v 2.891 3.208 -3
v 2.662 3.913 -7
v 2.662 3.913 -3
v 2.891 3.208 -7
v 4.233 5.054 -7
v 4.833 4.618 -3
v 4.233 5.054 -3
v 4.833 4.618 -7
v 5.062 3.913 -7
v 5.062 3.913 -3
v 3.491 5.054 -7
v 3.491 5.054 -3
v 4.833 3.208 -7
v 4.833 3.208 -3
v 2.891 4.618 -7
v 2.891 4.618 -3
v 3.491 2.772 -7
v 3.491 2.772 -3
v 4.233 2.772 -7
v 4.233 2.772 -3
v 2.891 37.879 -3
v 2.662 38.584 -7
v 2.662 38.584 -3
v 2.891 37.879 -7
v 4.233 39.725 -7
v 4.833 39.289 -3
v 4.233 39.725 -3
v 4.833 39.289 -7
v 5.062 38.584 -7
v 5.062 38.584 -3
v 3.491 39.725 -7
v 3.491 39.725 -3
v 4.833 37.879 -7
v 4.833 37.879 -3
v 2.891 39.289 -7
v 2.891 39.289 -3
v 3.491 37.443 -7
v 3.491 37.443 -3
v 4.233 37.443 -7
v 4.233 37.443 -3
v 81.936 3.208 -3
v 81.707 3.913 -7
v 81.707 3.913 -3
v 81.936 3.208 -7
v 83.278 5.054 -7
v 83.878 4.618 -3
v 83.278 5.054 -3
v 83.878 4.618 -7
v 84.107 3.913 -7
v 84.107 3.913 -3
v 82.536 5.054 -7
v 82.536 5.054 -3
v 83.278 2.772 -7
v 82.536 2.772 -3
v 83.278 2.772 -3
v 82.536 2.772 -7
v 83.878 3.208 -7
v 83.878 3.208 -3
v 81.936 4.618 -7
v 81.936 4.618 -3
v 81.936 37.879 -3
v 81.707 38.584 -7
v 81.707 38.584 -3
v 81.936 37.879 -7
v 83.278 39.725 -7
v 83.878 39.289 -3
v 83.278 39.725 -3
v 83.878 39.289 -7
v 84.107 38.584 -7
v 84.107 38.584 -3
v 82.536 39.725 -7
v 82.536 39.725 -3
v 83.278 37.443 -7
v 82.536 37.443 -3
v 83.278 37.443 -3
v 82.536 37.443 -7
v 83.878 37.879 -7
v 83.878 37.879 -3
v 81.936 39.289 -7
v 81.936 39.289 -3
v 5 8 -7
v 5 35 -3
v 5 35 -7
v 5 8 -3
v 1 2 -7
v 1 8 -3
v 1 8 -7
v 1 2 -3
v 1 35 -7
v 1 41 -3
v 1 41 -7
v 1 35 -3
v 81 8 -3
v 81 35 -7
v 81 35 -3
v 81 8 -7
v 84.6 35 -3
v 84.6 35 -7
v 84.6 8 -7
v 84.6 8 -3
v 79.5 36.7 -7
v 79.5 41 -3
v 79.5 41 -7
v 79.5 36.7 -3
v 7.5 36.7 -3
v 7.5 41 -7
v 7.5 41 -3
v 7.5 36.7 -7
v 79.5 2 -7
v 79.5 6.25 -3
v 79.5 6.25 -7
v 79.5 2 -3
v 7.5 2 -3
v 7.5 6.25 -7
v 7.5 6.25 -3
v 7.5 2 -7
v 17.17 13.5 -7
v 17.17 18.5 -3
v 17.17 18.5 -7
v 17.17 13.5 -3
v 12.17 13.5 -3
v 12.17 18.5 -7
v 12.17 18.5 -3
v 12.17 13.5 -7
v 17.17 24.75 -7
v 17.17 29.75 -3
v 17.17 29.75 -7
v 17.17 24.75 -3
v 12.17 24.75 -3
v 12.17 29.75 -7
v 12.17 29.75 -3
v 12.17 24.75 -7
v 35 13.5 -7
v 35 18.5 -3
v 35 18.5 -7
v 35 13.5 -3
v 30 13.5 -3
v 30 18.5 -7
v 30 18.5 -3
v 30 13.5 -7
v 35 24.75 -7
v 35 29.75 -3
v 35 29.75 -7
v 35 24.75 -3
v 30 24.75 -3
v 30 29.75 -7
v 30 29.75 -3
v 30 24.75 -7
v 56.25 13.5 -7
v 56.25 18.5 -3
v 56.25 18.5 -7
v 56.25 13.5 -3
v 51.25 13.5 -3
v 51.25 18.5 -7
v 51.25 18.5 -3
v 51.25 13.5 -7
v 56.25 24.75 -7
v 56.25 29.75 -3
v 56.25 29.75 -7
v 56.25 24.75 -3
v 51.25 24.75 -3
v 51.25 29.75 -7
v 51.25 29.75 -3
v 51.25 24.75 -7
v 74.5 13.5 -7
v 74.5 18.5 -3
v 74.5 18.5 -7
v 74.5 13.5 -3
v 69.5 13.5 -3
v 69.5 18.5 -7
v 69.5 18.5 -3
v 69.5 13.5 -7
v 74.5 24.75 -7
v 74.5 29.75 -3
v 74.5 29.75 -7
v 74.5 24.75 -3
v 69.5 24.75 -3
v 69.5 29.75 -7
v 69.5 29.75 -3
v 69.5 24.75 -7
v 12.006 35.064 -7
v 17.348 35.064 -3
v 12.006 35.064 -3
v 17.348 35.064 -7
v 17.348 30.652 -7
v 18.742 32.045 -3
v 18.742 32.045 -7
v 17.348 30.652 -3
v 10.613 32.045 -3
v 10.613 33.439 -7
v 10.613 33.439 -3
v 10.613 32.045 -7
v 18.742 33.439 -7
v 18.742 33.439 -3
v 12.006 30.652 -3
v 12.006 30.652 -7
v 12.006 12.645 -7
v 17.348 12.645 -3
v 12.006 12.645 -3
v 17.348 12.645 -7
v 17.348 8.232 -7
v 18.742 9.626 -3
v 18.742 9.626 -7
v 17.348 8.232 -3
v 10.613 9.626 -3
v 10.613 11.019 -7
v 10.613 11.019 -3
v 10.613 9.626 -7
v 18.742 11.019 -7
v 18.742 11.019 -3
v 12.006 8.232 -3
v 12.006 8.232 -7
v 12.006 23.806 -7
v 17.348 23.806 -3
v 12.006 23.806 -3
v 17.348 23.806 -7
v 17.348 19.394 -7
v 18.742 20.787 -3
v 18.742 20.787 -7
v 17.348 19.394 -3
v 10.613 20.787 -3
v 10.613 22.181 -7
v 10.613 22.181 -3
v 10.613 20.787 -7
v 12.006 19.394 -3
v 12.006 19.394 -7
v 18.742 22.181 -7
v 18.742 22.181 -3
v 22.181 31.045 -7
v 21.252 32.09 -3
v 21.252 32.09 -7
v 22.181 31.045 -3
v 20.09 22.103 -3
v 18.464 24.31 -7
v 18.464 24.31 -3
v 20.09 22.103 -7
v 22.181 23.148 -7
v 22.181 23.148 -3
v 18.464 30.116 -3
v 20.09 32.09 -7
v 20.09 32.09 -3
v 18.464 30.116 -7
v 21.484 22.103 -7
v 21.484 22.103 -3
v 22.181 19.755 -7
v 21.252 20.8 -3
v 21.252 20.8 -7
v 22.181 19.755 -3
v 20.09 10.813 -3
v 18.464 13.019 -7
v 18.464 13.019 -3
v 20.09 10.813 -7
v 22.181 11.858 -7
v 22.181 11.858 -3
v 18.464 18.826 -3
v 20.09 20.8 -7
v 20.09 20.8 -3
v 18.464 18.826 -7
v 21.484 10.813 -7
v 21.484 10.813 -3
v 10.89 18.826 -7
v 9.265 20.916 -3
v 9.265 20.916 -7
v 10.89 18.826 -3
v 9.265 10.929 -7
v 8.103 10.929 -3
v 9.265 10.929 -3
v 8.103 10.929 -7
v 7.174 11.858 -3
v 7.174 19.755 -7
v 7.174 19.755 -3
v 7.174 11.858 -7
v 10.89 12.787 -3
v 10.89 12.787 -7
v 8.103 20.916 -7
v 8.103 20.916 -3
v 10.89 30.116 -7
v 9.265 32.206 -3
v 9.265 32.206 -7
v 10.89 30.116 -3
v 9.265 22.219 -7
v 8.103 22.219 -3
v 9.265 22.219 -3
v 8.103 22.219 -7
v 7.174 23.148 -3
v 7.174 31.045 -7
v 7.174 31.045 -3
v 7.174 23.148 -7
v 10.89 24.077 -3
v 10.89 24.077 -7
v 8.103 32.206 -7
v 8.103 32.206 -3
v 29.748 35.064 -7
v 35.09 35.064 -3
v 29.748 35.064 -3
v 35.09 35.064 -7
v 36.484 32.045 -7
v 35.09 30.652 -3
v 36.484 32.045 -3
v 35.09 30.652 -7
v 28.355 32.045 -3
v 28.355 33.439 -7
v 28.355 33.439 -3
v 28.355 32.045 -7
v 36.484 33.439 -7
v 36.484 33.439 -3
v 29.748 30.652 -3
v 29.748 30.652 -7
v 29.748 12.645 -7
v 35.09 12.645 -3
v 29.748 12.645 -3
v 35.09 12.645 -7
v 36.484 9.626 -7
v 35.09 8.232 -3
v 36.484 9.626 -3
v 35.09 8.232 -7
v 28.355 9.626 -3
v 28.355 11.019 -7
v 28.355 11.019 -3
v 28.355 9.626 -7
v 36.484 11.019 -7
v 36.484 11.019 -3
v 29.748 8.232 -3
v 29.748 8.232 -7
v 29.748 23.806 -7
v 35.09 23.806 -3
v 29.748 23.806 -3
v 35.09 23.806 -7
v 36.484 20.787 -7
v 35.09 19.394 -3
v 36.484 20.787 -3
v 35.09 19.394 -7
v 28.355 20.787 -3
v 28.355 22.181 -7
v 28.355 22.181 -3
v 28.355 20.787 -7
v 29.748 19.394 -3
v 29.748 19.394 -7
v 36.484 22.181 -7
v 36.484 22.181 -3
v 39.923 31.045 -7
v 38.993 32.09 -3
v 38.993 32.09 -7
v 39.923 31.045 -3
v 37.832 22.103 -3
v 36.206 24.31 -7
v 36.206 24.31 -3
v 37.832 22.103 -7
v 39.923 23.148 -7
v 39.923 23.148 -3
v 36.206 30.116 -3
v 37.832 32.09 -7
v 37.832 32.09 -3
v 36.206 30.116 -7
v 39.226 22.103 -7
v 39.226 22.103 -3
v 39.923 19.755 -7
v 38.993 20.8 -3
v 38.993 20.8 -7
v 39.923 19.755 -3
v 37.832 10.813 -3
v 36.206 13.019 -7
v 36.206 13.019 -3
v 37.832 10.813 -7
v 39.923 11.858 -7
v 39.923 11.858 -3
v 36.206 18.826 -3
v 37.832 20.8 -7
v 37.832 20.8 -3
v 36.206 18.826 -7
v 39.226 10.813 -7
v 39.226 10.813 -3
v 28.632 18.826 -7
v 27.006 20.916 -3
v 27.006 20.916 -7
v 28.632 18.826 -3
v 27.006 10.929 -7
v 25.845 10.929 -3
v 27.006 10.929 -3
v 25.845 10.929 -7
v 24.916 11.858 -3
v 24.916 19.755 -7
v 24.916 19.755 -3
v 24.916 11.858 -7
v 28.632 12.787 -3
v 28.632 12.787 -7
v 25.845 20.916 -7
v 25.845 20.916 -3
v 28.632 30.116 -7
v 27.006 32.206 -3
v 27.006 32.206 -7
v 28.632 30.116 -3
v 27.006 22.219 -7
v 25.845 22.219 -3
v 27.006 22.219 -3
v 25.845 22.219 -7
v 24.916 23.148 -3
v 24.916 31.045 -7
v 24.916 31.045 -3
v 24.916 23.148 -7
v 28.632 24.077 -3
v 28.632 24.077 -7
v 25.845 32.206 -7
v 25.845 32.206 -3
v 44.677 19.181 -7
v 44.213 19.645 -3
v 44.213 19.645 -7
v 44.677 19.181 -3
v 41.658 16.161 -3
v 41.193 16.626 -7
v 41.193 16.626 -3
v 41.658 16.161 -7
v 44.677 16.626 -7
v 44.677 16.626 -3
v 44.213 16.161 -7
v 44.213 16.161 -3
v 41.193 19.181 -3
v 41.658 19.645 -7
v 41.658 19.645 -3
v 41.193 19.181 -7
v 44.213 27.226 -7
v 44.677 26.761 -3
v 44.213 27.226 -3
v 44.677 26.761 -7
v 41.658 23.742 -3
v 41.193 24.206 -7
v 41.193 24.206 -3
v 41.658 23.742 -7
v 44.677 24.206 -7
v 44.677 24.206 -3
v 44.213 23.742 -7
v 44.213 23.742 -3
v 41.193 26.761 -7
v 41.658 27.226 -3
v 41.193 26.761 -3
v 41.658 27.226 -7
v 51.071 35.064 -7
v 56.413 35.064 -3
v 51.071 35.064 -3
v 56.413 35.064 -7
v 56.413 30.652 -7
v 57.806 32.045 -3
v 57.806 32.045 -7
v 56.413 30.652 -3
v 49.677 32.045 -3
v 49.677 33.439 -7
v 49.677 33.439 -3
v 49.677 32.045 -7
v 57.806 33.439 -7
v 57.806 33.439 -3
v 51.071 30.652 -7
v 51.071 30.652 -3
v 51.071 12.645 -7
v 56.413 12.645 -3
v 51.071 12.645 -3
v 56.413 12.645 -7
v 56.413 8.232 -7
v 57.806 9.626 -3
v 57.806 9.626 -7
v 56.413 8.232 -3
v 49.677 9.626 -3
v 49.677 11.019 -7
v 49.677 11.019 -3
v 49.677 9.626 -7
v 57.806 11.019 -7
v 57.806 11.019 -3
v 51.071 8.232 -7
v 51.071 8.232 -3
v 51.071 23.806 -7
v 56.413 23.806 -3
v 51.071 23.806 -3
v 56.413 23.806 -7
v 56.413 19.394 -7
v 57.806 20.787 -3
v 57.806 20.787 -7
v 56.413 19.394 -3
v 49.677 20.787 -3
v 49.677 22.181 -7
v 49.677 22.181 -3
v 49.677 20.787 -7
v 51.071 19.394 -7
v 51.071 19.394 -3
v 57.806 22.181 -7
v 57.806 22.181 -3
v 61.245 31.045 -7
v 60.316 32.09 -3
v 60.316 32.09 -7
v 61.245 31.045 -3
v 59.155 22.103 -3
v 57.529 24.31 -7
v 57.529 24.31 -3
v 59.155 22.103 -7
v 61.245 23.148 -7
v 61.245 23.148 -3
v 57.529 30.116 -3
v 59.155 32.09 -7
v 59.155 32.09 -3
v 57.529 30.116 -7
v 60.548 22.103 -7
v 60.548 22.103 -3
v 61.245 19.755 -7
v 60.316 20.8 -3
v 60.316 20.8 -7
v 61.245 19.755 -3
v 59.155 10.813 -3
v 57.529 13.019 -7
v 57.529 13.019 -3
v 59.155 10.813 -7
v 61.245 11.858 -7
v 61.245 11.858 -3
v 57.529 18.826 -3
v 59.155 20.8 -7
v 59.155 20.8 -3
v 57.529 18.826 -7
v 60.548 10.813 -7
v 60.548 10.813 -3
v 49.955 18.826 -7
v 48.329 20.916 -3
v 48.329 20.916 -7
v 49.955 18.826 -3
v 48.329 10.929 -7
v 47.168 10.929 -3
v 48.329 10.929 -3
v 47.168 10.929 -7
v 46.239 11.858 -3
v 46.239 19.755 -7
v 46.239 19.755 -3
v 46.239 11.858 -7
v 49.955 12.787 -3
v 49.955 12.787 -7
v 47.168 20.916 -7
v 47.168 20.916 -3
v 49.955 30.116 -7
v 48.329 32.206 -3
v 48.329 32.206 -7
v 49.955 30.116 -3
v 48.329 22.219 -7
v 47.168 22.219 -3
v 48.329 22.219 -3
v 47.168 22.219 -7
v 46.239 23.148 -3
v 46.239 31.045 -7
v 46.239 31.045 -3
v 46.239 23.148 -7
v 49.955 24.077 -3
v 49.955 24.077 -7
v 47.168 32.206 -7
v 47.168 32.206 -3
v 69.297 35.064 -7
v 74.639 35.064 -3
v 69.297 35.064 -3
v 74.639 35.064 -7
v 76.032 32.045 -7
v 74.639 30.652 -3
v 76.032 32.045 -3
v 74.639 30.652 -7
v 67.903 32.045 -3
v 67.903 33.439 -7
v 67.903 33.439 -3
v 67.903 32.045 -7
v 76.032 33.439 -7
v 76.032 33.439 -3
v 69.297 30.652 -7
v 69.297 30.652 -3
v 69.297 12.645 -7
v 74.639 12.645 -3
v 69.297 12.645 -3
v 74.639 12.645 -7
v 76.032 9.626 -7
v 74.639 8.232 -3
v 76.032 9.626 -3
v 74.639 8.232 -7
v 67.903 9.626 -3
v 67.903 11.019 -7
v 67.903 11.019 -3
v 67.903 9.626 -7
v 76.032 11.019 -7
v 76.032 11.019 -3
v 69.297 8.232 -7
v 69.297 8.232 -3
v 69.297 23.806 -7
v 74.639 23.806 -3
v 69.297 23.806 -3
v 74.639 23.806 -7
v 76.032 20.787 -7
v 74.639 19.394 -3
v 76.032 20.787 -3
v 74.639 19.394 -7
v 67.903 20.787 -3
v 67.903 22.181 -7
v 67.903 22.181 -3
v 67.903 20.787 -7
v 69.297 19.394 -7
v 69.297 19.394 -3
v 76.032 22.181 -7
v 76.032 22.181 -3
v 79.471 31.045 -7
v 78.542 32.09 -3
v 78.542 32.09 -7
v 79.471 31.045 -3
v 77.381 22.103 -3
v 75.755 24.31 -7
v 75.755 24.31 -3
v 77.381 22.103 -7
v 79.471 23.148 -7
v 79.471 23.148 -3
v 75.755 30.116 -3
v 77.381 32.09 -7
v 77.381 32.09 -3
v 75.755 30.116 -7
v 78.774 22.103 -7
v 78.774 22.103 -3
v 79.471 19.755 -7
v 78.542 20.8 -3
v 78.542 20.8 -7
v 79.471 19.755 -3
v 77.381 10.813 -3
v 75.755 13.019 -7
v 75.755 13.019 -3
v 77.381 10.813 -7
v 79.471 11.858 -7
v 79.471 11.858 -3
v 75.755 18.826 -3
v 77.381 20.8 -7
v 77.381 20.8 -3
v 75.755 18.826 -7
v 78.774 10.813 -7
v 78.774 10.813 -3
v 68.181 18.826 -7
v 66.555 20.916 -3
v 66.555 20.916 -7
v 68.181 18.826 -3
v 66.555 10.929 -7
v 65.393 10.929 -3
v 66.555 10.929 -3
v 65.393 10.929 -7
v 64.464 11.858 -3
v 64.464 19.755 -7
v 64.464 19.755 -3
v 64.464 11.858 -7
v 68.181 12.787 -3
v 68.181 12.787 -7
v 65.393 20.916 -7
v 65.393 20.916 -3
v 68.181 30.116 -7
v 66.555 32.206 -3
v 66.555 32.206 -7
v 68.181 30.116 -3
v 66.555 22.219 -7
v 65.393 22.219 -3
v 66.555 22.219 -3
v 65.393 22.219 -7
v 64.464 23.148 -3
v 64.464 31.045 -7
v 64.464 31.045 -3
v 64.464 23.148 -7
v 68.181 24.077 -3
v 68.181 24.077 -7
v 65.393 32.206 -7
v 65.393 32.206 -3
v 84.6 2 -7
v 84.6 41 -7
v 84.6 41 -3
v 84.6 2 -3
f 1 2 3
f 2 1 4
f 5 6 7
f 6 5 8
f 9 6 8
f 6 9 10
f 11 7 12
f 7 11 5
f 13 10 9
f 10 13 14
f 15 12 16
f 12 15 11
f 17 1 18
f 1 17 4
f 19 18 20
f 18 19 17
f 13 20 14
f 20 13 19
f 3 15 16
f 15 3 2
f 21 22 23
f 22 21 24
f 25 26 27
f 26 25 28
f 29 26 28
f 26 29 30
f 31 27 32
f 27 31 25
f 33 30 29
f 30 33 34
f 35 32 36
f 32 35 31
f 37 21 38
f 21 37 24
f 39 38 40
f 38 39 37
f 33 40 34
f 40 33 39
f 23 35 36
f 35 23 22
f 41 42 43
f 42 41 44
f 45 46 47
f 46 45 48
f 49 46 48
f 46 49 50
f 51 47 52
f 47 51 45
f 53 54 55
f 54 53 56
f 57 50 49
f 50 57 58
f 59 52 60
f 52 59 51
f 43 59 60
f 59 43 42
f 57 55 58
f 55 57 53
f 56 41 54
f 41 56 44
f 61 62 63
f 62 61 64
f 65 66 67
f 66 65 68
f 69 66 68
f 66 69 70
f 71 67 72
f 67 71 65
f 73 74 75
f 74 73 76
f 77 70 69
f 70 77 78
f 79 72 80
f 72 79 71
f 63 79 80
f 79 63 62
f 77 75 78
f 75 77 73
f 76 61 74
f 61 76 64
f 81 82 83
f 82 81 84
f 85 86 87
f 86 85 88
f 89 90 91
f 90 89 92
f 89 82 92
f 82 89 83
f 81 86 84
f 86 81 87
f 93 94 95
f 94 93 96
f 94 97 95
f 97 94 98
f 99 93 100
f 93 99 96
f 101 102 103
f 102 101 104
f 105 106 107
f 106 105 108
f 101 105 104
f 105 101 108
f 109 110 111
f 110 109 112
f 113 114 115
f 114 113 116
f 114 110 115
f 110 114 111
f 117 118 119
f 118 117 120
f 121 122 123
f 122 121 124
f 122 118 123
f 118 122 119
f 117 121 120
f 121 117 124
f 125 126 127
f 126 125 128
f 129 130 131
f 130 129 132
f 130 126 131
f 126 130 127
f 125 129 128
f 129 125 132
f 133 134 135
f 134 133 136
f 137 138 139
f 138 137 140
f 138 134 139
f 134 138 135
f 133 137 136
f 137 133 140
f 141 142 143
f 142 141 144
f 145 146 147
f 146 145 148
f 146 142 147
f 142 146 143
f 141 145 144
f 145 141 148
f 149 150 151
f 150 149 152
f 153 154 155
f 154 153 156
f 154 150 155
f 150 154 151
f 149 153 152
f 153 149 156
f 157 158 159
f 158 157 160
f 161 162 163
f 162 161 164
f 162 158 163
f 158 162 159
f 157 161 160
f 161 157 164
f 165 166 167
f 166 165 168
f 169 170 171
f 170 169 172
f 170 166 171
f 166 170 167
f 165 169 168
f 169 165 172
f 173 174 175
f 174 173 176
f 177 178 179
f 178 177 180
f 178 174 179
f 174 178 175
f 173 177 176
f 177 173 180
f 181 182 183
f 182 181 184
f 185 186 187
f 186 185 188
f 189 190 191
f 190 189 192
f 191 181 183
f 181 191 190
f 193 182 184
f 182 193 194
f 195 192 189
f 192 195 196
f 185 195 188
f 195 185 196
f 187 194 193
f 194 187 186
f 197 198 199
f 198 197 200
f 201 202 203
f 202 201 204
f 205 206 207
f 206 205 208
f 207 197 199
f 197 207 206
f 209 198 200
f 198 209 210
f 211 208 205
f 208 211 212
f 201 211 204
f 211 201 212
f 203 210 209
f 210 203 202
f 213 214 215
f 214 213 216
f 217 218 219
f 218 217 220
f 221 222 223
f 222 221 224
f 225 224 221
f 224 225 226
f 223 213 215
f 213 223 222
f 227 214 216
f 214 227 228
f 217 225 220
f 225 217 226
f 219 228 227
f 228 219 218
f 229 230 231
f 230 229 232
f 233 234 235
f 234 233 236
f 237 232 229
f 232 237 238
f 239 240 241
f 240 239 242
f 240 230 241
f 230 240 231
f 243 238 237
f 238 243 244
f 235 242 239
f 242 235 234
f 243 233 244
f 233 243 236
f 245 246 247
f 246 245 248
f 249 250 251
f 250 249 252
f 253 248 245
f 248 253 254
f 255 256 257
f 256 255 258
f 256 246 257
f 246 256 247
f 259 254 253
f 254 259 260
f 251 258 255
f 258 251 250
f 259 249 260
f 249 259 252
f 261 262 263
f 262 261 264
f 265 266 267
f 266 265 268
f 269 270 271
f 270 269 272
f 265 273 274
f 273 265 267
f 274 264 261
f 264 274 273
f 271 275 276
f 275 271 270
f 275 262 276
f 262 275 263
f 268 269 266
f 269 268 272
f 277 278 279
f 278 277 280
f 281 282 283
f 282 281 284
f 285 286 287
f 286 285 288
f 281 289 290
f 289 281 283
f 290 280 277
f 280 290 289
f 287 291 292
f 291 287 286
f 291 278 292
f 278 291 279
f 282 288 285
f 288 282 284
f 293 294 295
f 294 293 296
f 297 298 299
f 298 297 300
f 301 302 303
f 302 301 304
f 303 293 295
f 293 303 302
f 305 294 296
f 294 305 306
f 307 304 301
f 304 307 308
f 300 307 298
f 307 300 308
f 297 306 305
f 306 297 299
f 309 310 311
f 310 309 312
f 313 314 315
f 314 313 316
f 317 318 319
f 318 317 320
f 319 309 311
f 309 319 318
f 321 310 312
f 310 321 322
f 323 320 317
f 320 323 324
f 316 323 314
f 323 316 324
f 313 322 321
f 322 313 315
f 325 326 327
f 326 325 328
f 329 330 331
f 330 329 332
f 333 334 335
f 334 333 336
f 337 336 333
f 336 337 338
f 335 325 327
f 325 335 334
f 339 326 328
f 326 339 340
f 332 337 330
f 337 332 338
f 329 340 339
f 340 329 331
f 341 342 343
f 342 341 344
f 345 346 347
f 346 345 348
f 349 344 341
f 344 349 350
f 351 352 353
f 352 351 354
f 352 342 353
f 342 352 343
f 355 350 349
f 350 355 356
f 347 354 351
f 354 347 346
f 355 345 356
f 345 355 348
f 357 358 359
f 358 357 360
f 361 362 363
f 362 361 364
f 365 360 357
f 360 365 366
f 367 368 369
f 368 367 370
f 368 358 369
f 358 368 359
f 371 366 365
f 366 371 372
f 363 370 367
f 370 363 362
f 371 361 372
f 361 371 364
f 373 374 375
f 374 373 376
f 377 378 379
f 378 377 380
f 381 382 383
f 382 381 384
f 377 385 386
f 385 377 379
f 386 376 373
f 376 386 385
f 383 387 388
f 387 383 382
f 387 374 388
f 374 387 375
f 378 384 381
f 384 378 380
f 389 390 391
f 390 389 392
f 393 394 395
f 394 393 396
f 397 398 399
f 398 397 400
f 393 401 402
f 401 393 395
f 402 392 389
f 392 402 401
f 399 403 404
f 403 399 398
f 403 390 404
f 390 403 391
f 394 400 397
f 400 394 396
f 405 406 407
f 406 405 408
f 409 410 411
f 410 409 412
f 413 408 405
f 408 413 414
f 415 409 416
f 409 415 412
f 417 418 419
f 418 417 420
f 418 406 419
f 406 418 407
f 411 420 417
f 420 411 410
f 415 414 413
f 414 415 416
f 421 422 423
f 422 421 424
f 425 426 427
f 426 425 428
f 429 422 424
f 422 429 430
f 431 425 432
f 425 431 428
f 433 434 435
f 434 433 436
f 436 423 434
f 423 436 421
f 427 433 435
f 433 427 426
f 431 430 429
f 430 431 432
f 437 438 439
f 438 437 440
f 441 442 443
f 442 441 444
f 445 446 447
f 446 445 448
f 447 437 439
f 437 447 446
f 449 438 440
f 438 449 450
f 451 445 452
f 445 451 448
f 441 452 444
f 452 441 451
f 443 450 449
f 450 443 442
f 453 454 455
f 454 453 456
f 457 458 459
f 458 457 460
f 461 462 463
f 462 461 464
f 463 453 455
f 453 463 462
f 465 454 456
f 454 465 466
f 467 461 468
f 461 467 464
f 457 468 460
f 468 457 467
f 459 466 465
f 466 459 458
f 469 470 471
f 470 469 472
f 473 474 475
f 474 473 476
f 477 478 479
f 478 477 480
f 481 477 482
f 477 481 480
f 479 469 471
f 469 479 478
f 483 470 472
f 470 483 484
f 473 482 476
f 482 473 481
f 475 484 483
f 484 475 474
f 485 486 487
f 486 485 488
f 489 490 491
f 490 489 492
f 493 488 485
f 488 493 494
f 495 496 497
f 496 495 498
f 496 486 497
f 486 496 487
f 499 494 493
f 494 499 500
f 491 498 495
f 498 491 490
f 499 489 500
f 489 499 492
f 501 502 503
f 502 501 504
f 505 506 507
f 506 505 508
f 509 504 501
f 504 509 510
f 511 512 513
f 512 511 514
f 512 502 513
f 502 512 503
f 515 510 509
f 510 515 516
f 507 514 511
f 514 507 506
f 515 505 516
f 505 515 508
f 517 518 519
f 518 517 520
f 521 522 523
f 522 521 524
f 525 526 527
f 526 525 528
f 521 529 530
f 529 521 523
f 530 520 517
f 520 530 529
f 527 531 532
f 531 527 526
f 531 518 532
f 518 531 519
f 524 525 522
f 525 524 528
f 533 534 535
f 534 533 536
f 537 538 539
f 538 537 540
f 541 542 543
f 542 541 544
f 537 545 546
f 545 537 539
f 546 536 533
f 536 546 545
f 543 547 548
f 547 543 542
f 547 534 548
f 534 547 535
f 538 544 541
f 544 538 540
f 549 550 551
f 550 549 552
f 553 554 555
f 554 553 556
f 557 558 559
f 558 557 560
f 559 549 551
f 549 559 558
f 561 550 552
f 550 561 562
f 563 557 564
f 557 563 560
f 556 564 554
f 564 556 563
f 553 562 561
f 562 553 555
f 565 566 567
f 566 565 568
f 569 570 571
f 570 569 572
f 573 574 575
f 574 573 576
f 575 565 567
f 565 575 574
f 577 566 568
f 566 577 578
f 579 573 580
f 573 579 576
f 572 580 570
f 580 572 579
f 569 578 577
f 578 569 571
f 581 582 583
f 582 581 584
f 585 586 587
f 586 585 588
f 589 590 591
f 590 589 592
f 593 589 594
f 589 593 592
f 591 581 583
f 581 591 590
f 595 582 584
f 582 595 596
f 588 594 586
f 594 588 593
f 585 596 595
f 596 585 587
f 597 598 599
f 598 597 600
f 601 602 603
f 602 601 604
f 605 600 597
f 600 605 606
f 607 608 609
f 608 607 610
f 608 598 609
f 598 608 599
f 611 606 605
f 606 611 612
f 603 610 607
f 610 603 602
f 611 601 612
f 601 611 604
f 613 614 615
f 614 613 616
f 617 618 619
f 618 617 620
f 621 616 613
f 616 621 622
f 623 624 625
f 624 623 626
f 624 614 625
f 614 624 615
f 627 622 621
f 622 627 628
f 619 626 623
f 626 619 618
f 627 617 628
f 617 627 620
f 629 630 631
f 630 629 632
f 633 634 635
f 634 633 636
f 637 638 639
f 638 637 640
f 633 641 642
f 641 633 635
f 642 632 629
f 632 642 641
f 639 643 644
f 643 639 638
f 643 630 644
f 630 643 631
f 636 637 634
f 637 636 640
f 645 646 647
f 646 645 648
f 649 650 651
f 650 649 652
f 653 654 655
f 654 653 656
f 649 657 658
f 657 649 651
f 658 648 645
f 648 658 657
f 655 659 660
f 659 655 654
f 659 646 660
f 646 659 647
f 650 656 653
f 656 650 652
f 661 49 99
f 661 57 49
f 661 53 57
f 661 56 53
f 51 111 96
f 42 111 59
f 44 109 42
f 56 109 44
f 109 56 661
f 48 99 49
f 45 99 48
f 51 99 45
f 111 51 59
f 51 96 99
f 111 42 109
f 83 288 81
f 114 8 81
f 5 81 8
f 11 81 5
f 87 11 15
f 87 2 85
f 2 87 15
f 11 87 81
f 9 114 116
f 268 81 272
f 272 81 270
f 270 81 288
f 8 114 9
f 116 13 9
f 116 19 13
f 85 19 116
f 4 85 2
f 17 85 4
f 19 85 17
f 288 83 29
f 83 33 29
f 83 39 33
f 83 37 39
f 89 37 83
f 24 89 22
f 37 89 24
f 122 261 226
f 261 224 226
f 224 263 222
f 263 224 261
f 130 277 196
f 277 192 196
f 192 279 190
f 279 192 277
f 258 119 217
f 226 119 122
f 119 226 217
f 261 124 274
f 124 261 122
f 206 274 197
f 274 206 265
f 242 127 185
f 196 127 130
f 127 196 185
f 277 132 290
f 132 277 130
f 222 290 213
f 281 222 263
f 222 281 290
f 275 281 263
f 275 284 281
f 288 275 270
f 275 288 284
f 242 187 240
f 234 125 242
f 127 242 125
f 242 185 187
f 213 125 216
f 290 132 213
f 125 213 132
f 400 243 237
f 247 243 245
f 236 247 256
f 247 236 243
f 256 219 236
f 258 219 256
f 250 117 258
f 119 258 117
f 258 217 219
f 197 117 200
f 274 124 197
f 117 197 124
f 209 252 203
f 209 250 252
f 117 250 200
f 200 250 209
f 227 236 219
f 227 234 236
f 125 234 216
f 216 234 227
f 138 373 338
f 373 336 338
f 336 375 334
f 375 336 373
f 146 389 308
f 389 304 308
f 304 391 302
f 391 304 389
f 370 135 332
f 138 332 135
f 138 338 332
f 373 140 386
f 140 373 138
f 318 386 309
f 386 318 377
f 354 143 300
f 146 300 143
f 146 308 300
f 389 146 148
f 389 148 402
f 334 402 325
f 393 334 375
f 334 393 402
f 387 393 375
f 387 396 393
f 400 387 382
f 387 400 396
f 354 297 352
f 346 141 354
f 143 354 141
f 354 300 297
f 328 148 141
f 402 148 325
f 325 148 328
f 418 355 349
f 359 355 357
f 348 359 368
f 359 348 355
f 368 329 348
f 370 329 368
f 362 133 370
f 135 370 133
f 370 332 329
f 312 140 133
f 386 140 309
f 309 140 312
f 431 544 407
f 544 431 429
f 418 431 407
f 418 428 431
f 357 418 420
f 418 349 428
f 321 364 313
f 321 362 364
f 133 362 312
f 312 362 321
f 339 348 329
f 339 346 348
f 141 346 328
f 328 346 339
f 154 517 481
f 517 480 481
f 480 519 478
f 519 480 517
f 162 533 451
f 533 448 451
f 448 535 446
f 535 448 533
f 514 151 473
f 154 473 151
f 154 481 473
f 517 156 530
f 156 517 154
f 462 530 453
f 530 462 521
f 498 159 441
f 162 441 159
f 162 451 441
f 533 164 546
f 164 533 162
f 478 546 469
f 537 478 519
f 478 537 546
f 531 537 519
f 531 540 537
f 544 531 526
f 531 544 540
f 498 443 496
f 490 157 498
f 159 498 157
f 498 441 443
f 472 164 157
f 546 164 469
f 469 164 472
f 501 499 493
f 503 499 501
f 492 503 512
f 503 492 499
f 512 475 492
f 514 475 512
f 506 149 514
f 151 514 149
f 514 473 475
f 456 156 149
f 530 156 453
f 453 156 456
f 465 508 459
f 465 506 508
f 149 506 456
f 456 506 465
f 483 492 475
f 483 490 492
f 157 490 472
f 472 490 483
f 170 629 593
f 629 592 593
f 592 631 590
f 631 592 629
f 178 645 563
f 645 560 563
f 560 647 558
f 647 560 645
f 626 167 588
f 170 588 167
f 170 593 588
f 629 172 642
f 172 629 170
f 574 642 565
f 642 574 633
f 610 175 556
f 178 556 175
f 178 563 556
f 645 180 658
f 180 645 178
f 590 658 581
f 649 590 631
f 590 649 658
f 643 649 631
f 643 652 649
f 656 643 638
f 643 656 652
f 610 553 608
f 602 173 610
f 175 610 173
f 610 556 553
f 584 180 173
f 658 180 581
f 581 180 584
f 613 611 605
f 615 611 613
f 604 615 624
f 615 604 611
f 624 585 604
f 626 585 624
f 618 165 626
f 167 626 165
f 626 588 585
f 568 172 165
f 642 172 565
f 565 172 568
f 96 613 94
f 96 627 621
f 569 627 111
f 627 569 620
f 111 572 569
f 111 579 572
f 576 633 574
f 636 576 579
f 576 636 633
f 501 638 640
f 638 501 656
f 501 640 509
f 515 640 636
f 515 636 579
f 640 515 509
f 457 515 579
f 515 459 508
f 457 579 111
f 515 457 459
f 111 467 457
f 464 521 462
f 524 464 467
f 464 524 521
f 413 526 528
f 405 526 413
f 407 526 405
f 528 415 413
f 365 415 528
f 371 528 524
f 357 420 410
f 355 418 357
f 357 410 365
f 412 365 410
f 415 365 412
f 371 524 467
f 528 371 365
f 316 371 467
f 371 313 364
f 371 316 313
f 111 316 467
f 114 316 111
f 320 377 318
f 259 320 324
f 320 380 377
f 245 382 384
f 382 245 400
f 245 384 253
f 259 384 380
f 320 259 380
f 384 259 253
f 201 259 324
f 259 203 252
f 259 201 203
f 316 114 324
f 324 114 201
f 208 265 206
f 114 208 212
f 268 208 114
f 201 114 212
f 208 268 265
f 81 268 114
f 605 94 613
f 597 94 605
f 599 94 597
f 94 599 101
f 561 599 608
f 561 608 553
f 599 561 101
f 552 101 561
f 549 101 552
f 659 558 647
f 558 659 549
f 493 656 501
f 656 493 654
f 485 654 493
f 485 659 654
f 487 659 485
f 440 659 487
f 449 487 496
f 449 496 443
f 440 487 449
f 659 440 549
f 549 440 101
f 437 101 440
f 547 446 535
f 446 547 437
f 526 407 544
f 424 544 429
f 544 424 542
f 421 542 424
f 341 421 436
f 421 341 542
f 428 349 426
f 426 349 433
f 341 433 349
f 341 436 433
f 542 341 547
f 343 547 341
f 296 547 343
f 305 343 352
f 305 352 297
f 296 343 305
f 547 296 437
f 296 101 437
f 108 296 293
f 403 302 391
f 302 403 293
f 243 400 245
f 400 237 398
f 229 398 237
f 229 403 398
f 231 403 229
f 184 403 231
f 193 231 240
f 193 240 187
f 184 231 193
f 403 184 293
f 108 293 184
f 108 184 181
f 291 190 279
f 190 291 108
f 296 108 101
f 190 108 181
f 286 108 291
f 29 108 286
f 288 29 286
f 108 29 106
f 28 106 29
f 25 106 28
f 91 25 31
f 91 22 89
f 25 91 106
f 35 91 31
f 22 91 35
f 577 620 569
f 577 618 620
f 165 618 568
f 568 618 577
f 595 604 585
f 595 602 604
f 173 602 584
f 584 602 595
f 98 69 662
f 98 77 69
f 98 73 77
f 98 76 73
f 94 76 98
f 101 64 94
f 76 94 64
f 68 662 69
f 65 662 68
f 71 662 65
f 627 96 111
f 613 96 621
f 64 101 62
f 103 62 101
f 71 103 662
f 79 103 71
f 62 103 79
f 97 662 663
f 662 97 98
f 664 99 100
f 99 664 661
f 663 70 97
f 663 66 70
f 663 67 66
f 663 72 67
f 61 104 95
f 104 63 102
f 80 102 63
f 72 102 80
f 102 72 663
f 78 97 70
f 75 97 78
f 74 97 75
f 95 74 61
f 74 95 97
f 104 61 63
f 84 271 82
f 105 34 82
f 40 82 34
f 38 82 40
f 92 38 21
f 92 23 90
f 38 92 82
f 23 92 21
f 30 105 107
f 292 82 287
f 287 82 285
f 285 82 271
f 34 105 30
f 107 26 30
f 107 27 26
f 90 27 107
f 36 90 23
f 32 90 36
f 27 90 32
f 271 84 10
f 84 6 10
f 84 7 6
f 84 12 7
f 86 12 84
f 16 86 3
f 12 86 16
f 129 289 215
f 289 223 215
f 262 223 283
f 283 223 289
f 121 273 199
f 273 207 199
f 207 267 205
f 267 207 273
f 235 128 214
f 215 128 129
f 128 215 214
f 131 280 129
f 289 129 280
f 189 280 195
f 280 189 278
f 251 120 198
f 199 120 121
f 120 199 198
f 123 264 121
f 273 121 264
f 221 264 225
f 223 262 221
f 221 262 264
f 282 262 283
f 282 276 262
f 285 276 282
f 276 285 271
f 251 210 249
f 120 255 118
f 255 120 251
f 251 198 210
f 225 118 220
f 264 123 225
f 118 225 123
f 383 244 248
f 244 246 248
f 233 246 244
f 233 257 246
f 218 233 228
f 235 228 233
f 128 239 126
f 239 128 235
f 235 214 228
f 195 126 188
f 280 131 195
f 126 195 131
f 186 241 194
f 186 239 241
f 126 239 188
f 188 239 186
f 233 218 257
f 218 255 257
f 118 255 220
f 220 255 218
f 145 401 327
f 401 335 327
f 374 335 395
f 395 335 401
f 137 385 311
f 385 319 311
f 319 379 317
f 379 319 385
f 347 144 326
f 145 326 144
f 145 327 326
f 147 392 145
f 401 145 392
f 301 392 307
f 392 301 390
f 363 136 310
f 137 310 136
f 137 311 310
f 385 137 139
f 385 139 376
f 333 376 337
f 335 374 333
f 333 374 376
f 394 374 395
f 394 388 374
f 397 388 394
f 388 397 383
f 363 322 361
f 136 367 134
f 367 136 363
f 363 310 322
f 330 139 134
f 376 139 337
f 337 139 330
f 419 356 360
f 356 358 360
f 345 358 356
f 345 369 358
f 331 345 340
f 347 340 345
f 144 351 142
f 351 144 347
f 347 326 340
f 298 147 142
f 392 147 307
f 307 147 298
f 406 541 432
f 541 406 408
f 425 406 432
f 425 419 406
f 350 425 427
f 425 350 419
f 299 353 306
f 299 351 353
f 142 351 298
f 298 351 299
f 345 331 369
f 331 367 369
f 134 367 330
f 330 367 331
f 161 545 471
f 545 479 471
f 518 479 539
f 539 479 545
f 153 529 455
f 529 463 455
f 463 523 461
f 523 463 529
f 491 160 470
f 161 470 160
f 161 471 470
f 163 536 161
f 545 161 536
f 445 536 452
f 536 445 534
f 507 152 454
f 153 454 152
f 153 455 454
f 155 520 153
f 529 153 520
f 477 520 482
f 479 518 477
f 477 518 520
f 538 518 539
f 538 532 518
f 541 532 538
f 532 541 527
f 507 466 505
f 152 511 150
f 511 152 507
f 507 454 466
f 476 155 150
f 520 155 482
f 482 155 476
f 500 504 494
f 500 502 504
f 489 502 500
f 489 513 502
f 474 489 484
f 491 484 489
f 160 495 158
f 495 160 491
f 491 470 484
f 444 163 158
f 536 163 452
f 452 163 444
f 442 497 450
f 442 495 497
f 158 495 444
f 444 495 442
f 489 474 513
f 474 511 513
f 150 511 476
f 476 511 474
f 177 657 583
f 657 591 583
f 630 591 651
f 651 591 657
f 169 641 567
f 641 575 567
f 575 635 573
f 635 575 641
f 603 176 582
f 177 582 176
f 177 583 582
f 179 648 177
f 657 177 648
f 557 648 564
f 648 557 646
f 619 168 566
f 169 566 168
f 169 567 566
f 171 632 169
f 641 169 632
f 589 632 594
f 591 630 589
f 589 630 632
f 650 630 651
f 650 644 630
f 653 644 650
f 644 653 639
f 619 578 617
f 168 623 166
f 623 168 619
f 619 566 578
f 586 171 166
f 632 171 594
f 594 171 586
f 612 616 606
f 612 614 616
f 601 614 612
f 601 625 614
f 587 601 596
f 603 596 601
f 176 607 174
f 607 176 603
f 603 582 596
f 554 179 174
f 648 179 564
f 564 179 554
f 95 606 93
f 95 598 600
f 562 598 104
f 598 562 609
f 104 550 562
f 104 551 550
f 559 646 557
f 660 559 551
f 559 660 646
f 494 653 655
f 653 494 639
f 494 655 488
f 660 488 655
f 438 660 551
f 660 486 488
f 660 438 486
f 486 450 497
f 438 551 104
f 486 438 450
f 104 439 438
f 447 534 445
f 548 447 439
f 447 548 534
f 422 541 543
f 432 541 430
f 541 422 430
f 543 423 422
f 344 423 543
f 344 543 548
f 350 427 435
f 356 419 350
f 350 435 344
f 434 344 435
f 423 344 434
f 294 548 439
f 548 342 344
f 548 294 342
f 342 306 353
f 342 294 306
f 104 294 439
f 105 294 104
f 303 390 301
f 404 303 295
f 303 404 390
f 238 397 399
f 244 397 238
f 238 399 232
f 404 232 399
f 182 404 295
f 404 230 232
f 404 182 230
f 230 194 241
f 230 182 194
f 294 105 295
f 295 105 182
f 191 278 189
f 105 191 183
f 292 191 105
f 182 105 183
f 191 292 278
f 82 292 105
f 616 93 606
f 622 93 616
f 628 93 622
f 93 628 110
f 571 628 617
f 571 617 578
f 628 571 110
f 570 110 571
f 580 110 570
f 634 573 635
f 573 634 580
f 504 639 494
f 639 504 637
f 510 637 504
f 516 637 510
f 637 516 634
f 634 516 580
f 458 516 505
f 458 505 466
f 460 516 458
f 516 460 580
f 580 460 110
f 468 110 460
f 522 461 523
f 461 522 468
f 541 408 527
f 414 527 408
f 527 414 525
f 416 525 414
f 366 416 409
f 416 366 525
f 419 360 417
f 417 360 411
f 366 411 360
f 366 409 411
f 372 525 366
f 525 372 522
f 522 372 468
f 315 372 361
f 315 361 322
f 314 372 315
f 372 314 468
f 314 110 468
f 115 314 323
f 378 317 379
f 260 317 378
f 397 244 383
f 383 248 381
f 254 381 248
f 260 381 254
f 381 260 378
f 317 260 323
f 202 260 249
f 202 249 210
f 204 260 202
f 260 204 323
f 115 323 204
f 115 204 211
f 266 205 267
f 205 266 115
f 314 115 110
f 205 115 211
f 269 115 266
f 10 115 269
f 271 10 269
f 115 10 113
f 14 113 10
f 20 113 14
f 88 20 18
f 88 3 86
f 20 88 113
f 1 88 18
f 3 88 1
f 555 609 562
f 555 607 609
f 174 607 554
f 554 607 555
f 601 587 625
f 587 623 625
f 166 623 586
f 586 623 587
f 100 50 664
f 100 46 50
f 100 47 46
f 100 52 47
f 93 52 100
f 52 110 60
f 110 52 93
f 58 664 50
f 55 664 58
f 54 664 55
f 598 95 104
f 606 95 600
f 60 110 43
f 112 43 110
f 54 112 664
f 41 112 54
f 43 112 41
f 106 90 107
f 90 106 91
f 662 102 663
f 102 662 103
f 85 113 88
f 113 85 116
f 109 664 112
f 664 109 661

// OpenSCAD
$fn = 10;

skinBreak = 0.01;       // extra depth to poke a hole through a surface

clipit = 1;    // Trim extra

//boardW = 146;
//boardH = 63.7;     // was 63.45 - tight

// Eagle dimensions of v.2 board
//  + slop to fit
eagleBoardW = 84; // (33 * 2.54);      // 83.82;
eagleBoardH = 40;   // (15.55 * 2.54); // 39.37;
eagleBoardD = 2.8; // 1.8;
eagleBoardX = .5;       // offset into board hole (1/2 of fudge value)
eagleBoardY = .5;
eagleBoardZ = 0;
boardW = eagleBoardW + (eagleBoardX*2);
boardH = eagleBoardH + (eagleBoardY*2);
boardD = eagleBoardD + skinBreak;

echo ("boardW: ", boardW);
echo ("boardH: ", boardH);
echo ("boardD: ", boardD);

boardFrameW = 3;
boardFrameX = 0;
boardFrameY = 0;

reflectorWidth = boardW;
reflectorHeight = boardH + boardFrameW;
reflectorDepth = 7;

refOffZ = reflectorDepth / 2;

strokeWidth = 0.3;



segMul = 1.27;


headerHeight = 2.7;
headerYOffset = 34.8;
headerAOffset = 6;
headerAWidth = 20;
headerY1Offset = 35;
headerBOffset = 55;
headerBWidth = 20;
headerY2Offset =  2.5;
headerCOffset = 50;
headerCWidth = 20;
headerY3Offset = 11.5;
headerDOffset = 1.5;
headerDHeight = 16;
headerDepth = 10;
headerBackDepth = 4;

module xpinClearance() {
    // pixel I/O header
        translate([headerAOffset, headerYOffset, -headerBackDepth])
            cube([headerAWidth, headerHeight, headerDepth]);
    // I2C header
        translate([headerBOffset, headerY1Offset, -headerBackDepth])
            cube([headerBWidth, headerHeight, headerDepth]);
    // prog header
        translate([headerCOffset, headerY2Offset, -headerBackDepth])
            cube([headerCWidth, headerHeight, headerDepth]);
    // pwr/spk header
        translate([headerDOffset, headerY3Offset, -headerBackDepth])
            cube([headerHeight, headerDHeight, headerDepth]);
}

cutoutZ = -9;
cutoutDepth = 10;

cutoutL = [ [6, 35.2, cutoutZ], [43, 35.2, cutoutZ], 
    [6, 0, cutoutZ], [30.5, 0, cutoutZ], [47, 0, cutoutZ], 
    [-.5,6.5,cutoutZ],
    [79.5, 6.5, cutoutZ], [ 79.5, 20.5, cutoutZ], 
    ];
cutoutD = [ [35, 5, cutoutDepth], [35, 5, cutoutDepth], 
    [23, 4.75, cutoutDepth], [15, 4.75, cutoutDepth], [31, 4.75, cutoutDepth],
    [4,27,cutoutDepth],
    [4,13,cutoutDepth], [4,13.5,cutoutDepth],
     ];
cutoutNum = 7;
cutoutClipL = [
    [-.5,6.5,cutoutZ], [79.5, 6.5, cutoutZ], 
    [6, 35.2, cutoutZ], [6, 0, cutoutZ],
    ];
cutoutClipD = [
    [4,27,cutoutDepth],    [4,27,cutoutDepth],
    [72, 5, cutoutDepth],  [72, 4.75, cutoutDepth],
     ];
cutoutClipNum = 3;

centerL = [ [10.67,12,cutoutZ], [10.67,23.25,cutoutZ],
            [28.5,12,cutoutZ], [28.5,23.25,cutoutZ],
            [49.75,12,cutoutZ], [49.75,23.25,cutoutZ],
            [68,12,cutoutZ], [68,23.25,cutoutZ],
];
centerD = [5,5,cutoutDepth];

centerNum = 7;

module pinClearance() {
    if (clipit) {
        for (i=[0:1:cutoutClipNum])
            translate(cutoutClipL[i])
                cube(cutoutClipD[i]);
    }
    else {
        for (i=[0:1:cutoutNum])
            translate(cutoutL[i])
                cube(cutoutD[i]);
    }
    for (i=[0:1:centerNum])
        translate(centerL[i])
            cube(centerD);

}


segMul = .254 * 2.54;

adgOffX = 8;
adgOffY = 2;
aOffX = 3.75;
aOffY = 33.25;
dOffY = -1.5;
gOffY = 15.8;
adgSeg = [ [-8.75,-1.5], [-8.75,1.5], [-5.75,5], [5.75,5],
           [8.75,1.5], [8.75,-1.5], [5.75,-4.5], [-5.75,-4.5] ];

bcOffX = 20.5;
bcOffY = 7.5;
bOffY = 19;
cOffY = 1.5;
bcSeg = [ [-4,-6], [-4,6.5], [-.5,10.75], [2,10.75],
          [4,8.5], [4,-8.5], [2.5,-10.75], [-.5,-10.75] ];

efOffX = 3;
efOffY = 7.5;
eOffY = 1.5;
fOffY = 19;
efSeg = [ [.5,-10.5], [-2,-10.5], [-4,-8.5], [-4,8.5],
          [-2,11],  [.5,11],  [4,6.5],  [4,-6.5] ];

colonCenterX = 3;
colonCenterY = 3;
colonOffY = 9.25;
colonOffY2 = 21;
colonSeg = [ [-3.75,-2.75], [-3.75,2.75],  [-2.75,3.75],  [2.75,3.75],
             [3.75,2.75],  [3.75,-2.75],  [2.75,-3.75],  [-2.75,-3.75] ];

segScale = .72;
module segment(path) {
    scale([segScale, segScale, 1])
    linear_extrude(height = reflectorDepth+1, center=true, scale=1)
        polygon(path);
}


segOffZ = -2.5;
module sevenSeg() {
    
    translate([adgOffX + aOffX, adgOffY + aOffY, segOffZ])
        segment(adgSeg);
    translate([adgOffX + aOffX, adgOffY + dOffY, segOffZ])
        segment(adgSeg);
    translate([adgOffX + aOffX, adgOffY + gOffY, segOffZ])
        segment(adgSeg);

    translate([bcOffX, bcOffY + bOffY, segOffZ])
        segment(bcSeg);
    translate([bcOffX, bcOffY + cOffY, segOffZ])
        segment(bcSeg);
    translate([efOffX, efOffY + eOffY, segOffZ])
        segment(efSeg);
    translate([efOffX, efOffY + fOffY, segOffZ])
        segment(efSeg);
}

module colons() {
    translate([colonCenterX, colonCenterY + colonOffY, segOffZ])
        segment(colonSeg);
    translate([colonCenterX, colonCenterY + colonOffY2, segOffZ])
        segment(colonSeg);
}

pixelArray = [ [3,5], [3,6.5], [3,9.5], [3,11],
    [4.5,3.5], [4.5,8], [4.5,12.5], 
    [6,3.5], [6,8], [6,12.5],
    [7.5,5], [7.5,6.5], [7.5,9.5], [7.5,11],
    [10,5], [10,6.5], [10,9.5], [10,11],
    [11.5,3.5], [11.5,8], [11.5,12.5], 
    [13,3.5], [13,8], [13,12.5],
    [14.5,5], [14.5,6.5], [14.5,9.5], [14.5,11],
    [16.5,6.5], [16.5,9.5],
    [18.5,5], [18.5,6.5], [18.5,9.5], [18.5,11],
    [20,3.5], [20,8], [20,12.5],
    [21.5,3.5], [21.5,8], [21.5,12.5],
    [23,5], [23,6.5], [23,9.5], [23,11],
    [25.5,5], [25.5,6.5], [25.5,9.5], [25.5,11],
    [27,3.5], [27,8], [27,12.5],
    [28.5,3.5], [28.5,8], [28.5,12.5],
    [30,5], [30,6.5], [30,9.5], [30,11],
 ];

pixelW = 2.5;
pixelH = 2.5;

module pixels() {
        for (i=pixelArray) {
 //           echo(2.54*i[0], 2.54*i[1]);
            translate([2.54*i[0]-pixelW/2, 2.54*i[1]-pixelH/2, -1])
                #cube([pixelW,pixelH,1]);
        }
}

module miniMountingHoles() {
holeX1 = .93 * 2.54;
holeX2 = 32.05 * 2.54;
holeY1 = .95 * 2.54;
holeY2 = 14.6 * 2.54;
holeZ = 0;
holeR = 2.4/2;
holeD = 10;
    // mounting holes
    translate([holeX1, holeY1, holeZ])
        cylinder(r=holeR, h=holeD, center=true);
    translate([holeX1, holeY2, holeZ])
        cylinder(r=holeR, h=holeD, center=true);
    translate([holeX2, holeY1, holeZ])
        cylinder(r=holeR, h=holeD, center=true);
    translate([holeX2, holeY2, holeZ])
        cylinder(r=holeR, h=holeD, center=true);

}

boardOffsetX = 1;
boardOffsetY = 1;
module miniboard() {
   translate([0, .5, 0])    // to fix sloppiness in board area
        cube([boardW-.8, boardH-.5, boardD]);
   translate([boardOffsetX, boardOffsetY, 0]) {
*        pixels();
        miniMountingHoles();
        pinClearance();
    }
}

module segments() {
    refX = 5.5+eagleBoardX;
    refY = 9.5+eagleBoardY;
        translate([refX, refY, 0]) {
            scale([segMul, segMul, 1])
                union() {
        
                translate([1, 0, -refOffZ]) {
          if (0) {
                    translate([1, 0, 0])
                        sevenSeg();
                    translate([28.5, 0, 0])
                        sevenSeg();
                    
                    translate([54, 0, 0])
                        colons();
                    
                    translate([62, 0, 0])
                        sevenSeg();
                    translate([89.5, 0, 0])
                        sevenSeg();
            }
            else {
                    translate([.7, 0, 0])
                        sevenSeg();
                    translate([28.2, 0, 0])
                        sevenSeg();
                    
                    translate([53.25, 0, 0])
                        colons();
                    
                    translate([61.25, 0, 0])
                        sevenSeg();
                    translate([89.5, 0, 0])
                        sevenSeg();
            }
                }
            }
        }

}


module microclock_reflector() {

    difference() {
        union() {
            // base to carve everything out of
            translate([boardFrameX-boardFrameW/4, boardFrameY-boardFrameW/4, -reflectorDepth])
                cube([boardW+boardFrameW-1, boardH+boardFrameW, reflectorDepth]);
echo("total w:", boardW+boardFrameW-1, " h:", boardH+boardFrameW, " d:", reflectorDepth );
        }
        union() {
            translate([eagleBoardX, eagleBoardY, -boardD+skinBreak*2])
                miniboard();
            segments();
        }
    }
}

clipitL = [ 1, -boardFrameW+5, -10 ];
clipitD = [ boardW-1.4, boardH-2, reflectorDepth ];

sectL = [ -5, -5, -5 ];
sectD = [boardW+boardFrameW*2+10, boardH+boardFrameW*2+6+10, 2];

takeSlice = 0;

if (takeSlice) {
    intersection() {
        microclock_reflector();
        translate(sectL)
            cube(sectD);
   }
}
else {
   if (clipit) {
        intersection() {
            microclock_reflector();
            translate(clipitL)
                cube(clipitD);
        }
    }
    else
        microclock_reflector();
}
